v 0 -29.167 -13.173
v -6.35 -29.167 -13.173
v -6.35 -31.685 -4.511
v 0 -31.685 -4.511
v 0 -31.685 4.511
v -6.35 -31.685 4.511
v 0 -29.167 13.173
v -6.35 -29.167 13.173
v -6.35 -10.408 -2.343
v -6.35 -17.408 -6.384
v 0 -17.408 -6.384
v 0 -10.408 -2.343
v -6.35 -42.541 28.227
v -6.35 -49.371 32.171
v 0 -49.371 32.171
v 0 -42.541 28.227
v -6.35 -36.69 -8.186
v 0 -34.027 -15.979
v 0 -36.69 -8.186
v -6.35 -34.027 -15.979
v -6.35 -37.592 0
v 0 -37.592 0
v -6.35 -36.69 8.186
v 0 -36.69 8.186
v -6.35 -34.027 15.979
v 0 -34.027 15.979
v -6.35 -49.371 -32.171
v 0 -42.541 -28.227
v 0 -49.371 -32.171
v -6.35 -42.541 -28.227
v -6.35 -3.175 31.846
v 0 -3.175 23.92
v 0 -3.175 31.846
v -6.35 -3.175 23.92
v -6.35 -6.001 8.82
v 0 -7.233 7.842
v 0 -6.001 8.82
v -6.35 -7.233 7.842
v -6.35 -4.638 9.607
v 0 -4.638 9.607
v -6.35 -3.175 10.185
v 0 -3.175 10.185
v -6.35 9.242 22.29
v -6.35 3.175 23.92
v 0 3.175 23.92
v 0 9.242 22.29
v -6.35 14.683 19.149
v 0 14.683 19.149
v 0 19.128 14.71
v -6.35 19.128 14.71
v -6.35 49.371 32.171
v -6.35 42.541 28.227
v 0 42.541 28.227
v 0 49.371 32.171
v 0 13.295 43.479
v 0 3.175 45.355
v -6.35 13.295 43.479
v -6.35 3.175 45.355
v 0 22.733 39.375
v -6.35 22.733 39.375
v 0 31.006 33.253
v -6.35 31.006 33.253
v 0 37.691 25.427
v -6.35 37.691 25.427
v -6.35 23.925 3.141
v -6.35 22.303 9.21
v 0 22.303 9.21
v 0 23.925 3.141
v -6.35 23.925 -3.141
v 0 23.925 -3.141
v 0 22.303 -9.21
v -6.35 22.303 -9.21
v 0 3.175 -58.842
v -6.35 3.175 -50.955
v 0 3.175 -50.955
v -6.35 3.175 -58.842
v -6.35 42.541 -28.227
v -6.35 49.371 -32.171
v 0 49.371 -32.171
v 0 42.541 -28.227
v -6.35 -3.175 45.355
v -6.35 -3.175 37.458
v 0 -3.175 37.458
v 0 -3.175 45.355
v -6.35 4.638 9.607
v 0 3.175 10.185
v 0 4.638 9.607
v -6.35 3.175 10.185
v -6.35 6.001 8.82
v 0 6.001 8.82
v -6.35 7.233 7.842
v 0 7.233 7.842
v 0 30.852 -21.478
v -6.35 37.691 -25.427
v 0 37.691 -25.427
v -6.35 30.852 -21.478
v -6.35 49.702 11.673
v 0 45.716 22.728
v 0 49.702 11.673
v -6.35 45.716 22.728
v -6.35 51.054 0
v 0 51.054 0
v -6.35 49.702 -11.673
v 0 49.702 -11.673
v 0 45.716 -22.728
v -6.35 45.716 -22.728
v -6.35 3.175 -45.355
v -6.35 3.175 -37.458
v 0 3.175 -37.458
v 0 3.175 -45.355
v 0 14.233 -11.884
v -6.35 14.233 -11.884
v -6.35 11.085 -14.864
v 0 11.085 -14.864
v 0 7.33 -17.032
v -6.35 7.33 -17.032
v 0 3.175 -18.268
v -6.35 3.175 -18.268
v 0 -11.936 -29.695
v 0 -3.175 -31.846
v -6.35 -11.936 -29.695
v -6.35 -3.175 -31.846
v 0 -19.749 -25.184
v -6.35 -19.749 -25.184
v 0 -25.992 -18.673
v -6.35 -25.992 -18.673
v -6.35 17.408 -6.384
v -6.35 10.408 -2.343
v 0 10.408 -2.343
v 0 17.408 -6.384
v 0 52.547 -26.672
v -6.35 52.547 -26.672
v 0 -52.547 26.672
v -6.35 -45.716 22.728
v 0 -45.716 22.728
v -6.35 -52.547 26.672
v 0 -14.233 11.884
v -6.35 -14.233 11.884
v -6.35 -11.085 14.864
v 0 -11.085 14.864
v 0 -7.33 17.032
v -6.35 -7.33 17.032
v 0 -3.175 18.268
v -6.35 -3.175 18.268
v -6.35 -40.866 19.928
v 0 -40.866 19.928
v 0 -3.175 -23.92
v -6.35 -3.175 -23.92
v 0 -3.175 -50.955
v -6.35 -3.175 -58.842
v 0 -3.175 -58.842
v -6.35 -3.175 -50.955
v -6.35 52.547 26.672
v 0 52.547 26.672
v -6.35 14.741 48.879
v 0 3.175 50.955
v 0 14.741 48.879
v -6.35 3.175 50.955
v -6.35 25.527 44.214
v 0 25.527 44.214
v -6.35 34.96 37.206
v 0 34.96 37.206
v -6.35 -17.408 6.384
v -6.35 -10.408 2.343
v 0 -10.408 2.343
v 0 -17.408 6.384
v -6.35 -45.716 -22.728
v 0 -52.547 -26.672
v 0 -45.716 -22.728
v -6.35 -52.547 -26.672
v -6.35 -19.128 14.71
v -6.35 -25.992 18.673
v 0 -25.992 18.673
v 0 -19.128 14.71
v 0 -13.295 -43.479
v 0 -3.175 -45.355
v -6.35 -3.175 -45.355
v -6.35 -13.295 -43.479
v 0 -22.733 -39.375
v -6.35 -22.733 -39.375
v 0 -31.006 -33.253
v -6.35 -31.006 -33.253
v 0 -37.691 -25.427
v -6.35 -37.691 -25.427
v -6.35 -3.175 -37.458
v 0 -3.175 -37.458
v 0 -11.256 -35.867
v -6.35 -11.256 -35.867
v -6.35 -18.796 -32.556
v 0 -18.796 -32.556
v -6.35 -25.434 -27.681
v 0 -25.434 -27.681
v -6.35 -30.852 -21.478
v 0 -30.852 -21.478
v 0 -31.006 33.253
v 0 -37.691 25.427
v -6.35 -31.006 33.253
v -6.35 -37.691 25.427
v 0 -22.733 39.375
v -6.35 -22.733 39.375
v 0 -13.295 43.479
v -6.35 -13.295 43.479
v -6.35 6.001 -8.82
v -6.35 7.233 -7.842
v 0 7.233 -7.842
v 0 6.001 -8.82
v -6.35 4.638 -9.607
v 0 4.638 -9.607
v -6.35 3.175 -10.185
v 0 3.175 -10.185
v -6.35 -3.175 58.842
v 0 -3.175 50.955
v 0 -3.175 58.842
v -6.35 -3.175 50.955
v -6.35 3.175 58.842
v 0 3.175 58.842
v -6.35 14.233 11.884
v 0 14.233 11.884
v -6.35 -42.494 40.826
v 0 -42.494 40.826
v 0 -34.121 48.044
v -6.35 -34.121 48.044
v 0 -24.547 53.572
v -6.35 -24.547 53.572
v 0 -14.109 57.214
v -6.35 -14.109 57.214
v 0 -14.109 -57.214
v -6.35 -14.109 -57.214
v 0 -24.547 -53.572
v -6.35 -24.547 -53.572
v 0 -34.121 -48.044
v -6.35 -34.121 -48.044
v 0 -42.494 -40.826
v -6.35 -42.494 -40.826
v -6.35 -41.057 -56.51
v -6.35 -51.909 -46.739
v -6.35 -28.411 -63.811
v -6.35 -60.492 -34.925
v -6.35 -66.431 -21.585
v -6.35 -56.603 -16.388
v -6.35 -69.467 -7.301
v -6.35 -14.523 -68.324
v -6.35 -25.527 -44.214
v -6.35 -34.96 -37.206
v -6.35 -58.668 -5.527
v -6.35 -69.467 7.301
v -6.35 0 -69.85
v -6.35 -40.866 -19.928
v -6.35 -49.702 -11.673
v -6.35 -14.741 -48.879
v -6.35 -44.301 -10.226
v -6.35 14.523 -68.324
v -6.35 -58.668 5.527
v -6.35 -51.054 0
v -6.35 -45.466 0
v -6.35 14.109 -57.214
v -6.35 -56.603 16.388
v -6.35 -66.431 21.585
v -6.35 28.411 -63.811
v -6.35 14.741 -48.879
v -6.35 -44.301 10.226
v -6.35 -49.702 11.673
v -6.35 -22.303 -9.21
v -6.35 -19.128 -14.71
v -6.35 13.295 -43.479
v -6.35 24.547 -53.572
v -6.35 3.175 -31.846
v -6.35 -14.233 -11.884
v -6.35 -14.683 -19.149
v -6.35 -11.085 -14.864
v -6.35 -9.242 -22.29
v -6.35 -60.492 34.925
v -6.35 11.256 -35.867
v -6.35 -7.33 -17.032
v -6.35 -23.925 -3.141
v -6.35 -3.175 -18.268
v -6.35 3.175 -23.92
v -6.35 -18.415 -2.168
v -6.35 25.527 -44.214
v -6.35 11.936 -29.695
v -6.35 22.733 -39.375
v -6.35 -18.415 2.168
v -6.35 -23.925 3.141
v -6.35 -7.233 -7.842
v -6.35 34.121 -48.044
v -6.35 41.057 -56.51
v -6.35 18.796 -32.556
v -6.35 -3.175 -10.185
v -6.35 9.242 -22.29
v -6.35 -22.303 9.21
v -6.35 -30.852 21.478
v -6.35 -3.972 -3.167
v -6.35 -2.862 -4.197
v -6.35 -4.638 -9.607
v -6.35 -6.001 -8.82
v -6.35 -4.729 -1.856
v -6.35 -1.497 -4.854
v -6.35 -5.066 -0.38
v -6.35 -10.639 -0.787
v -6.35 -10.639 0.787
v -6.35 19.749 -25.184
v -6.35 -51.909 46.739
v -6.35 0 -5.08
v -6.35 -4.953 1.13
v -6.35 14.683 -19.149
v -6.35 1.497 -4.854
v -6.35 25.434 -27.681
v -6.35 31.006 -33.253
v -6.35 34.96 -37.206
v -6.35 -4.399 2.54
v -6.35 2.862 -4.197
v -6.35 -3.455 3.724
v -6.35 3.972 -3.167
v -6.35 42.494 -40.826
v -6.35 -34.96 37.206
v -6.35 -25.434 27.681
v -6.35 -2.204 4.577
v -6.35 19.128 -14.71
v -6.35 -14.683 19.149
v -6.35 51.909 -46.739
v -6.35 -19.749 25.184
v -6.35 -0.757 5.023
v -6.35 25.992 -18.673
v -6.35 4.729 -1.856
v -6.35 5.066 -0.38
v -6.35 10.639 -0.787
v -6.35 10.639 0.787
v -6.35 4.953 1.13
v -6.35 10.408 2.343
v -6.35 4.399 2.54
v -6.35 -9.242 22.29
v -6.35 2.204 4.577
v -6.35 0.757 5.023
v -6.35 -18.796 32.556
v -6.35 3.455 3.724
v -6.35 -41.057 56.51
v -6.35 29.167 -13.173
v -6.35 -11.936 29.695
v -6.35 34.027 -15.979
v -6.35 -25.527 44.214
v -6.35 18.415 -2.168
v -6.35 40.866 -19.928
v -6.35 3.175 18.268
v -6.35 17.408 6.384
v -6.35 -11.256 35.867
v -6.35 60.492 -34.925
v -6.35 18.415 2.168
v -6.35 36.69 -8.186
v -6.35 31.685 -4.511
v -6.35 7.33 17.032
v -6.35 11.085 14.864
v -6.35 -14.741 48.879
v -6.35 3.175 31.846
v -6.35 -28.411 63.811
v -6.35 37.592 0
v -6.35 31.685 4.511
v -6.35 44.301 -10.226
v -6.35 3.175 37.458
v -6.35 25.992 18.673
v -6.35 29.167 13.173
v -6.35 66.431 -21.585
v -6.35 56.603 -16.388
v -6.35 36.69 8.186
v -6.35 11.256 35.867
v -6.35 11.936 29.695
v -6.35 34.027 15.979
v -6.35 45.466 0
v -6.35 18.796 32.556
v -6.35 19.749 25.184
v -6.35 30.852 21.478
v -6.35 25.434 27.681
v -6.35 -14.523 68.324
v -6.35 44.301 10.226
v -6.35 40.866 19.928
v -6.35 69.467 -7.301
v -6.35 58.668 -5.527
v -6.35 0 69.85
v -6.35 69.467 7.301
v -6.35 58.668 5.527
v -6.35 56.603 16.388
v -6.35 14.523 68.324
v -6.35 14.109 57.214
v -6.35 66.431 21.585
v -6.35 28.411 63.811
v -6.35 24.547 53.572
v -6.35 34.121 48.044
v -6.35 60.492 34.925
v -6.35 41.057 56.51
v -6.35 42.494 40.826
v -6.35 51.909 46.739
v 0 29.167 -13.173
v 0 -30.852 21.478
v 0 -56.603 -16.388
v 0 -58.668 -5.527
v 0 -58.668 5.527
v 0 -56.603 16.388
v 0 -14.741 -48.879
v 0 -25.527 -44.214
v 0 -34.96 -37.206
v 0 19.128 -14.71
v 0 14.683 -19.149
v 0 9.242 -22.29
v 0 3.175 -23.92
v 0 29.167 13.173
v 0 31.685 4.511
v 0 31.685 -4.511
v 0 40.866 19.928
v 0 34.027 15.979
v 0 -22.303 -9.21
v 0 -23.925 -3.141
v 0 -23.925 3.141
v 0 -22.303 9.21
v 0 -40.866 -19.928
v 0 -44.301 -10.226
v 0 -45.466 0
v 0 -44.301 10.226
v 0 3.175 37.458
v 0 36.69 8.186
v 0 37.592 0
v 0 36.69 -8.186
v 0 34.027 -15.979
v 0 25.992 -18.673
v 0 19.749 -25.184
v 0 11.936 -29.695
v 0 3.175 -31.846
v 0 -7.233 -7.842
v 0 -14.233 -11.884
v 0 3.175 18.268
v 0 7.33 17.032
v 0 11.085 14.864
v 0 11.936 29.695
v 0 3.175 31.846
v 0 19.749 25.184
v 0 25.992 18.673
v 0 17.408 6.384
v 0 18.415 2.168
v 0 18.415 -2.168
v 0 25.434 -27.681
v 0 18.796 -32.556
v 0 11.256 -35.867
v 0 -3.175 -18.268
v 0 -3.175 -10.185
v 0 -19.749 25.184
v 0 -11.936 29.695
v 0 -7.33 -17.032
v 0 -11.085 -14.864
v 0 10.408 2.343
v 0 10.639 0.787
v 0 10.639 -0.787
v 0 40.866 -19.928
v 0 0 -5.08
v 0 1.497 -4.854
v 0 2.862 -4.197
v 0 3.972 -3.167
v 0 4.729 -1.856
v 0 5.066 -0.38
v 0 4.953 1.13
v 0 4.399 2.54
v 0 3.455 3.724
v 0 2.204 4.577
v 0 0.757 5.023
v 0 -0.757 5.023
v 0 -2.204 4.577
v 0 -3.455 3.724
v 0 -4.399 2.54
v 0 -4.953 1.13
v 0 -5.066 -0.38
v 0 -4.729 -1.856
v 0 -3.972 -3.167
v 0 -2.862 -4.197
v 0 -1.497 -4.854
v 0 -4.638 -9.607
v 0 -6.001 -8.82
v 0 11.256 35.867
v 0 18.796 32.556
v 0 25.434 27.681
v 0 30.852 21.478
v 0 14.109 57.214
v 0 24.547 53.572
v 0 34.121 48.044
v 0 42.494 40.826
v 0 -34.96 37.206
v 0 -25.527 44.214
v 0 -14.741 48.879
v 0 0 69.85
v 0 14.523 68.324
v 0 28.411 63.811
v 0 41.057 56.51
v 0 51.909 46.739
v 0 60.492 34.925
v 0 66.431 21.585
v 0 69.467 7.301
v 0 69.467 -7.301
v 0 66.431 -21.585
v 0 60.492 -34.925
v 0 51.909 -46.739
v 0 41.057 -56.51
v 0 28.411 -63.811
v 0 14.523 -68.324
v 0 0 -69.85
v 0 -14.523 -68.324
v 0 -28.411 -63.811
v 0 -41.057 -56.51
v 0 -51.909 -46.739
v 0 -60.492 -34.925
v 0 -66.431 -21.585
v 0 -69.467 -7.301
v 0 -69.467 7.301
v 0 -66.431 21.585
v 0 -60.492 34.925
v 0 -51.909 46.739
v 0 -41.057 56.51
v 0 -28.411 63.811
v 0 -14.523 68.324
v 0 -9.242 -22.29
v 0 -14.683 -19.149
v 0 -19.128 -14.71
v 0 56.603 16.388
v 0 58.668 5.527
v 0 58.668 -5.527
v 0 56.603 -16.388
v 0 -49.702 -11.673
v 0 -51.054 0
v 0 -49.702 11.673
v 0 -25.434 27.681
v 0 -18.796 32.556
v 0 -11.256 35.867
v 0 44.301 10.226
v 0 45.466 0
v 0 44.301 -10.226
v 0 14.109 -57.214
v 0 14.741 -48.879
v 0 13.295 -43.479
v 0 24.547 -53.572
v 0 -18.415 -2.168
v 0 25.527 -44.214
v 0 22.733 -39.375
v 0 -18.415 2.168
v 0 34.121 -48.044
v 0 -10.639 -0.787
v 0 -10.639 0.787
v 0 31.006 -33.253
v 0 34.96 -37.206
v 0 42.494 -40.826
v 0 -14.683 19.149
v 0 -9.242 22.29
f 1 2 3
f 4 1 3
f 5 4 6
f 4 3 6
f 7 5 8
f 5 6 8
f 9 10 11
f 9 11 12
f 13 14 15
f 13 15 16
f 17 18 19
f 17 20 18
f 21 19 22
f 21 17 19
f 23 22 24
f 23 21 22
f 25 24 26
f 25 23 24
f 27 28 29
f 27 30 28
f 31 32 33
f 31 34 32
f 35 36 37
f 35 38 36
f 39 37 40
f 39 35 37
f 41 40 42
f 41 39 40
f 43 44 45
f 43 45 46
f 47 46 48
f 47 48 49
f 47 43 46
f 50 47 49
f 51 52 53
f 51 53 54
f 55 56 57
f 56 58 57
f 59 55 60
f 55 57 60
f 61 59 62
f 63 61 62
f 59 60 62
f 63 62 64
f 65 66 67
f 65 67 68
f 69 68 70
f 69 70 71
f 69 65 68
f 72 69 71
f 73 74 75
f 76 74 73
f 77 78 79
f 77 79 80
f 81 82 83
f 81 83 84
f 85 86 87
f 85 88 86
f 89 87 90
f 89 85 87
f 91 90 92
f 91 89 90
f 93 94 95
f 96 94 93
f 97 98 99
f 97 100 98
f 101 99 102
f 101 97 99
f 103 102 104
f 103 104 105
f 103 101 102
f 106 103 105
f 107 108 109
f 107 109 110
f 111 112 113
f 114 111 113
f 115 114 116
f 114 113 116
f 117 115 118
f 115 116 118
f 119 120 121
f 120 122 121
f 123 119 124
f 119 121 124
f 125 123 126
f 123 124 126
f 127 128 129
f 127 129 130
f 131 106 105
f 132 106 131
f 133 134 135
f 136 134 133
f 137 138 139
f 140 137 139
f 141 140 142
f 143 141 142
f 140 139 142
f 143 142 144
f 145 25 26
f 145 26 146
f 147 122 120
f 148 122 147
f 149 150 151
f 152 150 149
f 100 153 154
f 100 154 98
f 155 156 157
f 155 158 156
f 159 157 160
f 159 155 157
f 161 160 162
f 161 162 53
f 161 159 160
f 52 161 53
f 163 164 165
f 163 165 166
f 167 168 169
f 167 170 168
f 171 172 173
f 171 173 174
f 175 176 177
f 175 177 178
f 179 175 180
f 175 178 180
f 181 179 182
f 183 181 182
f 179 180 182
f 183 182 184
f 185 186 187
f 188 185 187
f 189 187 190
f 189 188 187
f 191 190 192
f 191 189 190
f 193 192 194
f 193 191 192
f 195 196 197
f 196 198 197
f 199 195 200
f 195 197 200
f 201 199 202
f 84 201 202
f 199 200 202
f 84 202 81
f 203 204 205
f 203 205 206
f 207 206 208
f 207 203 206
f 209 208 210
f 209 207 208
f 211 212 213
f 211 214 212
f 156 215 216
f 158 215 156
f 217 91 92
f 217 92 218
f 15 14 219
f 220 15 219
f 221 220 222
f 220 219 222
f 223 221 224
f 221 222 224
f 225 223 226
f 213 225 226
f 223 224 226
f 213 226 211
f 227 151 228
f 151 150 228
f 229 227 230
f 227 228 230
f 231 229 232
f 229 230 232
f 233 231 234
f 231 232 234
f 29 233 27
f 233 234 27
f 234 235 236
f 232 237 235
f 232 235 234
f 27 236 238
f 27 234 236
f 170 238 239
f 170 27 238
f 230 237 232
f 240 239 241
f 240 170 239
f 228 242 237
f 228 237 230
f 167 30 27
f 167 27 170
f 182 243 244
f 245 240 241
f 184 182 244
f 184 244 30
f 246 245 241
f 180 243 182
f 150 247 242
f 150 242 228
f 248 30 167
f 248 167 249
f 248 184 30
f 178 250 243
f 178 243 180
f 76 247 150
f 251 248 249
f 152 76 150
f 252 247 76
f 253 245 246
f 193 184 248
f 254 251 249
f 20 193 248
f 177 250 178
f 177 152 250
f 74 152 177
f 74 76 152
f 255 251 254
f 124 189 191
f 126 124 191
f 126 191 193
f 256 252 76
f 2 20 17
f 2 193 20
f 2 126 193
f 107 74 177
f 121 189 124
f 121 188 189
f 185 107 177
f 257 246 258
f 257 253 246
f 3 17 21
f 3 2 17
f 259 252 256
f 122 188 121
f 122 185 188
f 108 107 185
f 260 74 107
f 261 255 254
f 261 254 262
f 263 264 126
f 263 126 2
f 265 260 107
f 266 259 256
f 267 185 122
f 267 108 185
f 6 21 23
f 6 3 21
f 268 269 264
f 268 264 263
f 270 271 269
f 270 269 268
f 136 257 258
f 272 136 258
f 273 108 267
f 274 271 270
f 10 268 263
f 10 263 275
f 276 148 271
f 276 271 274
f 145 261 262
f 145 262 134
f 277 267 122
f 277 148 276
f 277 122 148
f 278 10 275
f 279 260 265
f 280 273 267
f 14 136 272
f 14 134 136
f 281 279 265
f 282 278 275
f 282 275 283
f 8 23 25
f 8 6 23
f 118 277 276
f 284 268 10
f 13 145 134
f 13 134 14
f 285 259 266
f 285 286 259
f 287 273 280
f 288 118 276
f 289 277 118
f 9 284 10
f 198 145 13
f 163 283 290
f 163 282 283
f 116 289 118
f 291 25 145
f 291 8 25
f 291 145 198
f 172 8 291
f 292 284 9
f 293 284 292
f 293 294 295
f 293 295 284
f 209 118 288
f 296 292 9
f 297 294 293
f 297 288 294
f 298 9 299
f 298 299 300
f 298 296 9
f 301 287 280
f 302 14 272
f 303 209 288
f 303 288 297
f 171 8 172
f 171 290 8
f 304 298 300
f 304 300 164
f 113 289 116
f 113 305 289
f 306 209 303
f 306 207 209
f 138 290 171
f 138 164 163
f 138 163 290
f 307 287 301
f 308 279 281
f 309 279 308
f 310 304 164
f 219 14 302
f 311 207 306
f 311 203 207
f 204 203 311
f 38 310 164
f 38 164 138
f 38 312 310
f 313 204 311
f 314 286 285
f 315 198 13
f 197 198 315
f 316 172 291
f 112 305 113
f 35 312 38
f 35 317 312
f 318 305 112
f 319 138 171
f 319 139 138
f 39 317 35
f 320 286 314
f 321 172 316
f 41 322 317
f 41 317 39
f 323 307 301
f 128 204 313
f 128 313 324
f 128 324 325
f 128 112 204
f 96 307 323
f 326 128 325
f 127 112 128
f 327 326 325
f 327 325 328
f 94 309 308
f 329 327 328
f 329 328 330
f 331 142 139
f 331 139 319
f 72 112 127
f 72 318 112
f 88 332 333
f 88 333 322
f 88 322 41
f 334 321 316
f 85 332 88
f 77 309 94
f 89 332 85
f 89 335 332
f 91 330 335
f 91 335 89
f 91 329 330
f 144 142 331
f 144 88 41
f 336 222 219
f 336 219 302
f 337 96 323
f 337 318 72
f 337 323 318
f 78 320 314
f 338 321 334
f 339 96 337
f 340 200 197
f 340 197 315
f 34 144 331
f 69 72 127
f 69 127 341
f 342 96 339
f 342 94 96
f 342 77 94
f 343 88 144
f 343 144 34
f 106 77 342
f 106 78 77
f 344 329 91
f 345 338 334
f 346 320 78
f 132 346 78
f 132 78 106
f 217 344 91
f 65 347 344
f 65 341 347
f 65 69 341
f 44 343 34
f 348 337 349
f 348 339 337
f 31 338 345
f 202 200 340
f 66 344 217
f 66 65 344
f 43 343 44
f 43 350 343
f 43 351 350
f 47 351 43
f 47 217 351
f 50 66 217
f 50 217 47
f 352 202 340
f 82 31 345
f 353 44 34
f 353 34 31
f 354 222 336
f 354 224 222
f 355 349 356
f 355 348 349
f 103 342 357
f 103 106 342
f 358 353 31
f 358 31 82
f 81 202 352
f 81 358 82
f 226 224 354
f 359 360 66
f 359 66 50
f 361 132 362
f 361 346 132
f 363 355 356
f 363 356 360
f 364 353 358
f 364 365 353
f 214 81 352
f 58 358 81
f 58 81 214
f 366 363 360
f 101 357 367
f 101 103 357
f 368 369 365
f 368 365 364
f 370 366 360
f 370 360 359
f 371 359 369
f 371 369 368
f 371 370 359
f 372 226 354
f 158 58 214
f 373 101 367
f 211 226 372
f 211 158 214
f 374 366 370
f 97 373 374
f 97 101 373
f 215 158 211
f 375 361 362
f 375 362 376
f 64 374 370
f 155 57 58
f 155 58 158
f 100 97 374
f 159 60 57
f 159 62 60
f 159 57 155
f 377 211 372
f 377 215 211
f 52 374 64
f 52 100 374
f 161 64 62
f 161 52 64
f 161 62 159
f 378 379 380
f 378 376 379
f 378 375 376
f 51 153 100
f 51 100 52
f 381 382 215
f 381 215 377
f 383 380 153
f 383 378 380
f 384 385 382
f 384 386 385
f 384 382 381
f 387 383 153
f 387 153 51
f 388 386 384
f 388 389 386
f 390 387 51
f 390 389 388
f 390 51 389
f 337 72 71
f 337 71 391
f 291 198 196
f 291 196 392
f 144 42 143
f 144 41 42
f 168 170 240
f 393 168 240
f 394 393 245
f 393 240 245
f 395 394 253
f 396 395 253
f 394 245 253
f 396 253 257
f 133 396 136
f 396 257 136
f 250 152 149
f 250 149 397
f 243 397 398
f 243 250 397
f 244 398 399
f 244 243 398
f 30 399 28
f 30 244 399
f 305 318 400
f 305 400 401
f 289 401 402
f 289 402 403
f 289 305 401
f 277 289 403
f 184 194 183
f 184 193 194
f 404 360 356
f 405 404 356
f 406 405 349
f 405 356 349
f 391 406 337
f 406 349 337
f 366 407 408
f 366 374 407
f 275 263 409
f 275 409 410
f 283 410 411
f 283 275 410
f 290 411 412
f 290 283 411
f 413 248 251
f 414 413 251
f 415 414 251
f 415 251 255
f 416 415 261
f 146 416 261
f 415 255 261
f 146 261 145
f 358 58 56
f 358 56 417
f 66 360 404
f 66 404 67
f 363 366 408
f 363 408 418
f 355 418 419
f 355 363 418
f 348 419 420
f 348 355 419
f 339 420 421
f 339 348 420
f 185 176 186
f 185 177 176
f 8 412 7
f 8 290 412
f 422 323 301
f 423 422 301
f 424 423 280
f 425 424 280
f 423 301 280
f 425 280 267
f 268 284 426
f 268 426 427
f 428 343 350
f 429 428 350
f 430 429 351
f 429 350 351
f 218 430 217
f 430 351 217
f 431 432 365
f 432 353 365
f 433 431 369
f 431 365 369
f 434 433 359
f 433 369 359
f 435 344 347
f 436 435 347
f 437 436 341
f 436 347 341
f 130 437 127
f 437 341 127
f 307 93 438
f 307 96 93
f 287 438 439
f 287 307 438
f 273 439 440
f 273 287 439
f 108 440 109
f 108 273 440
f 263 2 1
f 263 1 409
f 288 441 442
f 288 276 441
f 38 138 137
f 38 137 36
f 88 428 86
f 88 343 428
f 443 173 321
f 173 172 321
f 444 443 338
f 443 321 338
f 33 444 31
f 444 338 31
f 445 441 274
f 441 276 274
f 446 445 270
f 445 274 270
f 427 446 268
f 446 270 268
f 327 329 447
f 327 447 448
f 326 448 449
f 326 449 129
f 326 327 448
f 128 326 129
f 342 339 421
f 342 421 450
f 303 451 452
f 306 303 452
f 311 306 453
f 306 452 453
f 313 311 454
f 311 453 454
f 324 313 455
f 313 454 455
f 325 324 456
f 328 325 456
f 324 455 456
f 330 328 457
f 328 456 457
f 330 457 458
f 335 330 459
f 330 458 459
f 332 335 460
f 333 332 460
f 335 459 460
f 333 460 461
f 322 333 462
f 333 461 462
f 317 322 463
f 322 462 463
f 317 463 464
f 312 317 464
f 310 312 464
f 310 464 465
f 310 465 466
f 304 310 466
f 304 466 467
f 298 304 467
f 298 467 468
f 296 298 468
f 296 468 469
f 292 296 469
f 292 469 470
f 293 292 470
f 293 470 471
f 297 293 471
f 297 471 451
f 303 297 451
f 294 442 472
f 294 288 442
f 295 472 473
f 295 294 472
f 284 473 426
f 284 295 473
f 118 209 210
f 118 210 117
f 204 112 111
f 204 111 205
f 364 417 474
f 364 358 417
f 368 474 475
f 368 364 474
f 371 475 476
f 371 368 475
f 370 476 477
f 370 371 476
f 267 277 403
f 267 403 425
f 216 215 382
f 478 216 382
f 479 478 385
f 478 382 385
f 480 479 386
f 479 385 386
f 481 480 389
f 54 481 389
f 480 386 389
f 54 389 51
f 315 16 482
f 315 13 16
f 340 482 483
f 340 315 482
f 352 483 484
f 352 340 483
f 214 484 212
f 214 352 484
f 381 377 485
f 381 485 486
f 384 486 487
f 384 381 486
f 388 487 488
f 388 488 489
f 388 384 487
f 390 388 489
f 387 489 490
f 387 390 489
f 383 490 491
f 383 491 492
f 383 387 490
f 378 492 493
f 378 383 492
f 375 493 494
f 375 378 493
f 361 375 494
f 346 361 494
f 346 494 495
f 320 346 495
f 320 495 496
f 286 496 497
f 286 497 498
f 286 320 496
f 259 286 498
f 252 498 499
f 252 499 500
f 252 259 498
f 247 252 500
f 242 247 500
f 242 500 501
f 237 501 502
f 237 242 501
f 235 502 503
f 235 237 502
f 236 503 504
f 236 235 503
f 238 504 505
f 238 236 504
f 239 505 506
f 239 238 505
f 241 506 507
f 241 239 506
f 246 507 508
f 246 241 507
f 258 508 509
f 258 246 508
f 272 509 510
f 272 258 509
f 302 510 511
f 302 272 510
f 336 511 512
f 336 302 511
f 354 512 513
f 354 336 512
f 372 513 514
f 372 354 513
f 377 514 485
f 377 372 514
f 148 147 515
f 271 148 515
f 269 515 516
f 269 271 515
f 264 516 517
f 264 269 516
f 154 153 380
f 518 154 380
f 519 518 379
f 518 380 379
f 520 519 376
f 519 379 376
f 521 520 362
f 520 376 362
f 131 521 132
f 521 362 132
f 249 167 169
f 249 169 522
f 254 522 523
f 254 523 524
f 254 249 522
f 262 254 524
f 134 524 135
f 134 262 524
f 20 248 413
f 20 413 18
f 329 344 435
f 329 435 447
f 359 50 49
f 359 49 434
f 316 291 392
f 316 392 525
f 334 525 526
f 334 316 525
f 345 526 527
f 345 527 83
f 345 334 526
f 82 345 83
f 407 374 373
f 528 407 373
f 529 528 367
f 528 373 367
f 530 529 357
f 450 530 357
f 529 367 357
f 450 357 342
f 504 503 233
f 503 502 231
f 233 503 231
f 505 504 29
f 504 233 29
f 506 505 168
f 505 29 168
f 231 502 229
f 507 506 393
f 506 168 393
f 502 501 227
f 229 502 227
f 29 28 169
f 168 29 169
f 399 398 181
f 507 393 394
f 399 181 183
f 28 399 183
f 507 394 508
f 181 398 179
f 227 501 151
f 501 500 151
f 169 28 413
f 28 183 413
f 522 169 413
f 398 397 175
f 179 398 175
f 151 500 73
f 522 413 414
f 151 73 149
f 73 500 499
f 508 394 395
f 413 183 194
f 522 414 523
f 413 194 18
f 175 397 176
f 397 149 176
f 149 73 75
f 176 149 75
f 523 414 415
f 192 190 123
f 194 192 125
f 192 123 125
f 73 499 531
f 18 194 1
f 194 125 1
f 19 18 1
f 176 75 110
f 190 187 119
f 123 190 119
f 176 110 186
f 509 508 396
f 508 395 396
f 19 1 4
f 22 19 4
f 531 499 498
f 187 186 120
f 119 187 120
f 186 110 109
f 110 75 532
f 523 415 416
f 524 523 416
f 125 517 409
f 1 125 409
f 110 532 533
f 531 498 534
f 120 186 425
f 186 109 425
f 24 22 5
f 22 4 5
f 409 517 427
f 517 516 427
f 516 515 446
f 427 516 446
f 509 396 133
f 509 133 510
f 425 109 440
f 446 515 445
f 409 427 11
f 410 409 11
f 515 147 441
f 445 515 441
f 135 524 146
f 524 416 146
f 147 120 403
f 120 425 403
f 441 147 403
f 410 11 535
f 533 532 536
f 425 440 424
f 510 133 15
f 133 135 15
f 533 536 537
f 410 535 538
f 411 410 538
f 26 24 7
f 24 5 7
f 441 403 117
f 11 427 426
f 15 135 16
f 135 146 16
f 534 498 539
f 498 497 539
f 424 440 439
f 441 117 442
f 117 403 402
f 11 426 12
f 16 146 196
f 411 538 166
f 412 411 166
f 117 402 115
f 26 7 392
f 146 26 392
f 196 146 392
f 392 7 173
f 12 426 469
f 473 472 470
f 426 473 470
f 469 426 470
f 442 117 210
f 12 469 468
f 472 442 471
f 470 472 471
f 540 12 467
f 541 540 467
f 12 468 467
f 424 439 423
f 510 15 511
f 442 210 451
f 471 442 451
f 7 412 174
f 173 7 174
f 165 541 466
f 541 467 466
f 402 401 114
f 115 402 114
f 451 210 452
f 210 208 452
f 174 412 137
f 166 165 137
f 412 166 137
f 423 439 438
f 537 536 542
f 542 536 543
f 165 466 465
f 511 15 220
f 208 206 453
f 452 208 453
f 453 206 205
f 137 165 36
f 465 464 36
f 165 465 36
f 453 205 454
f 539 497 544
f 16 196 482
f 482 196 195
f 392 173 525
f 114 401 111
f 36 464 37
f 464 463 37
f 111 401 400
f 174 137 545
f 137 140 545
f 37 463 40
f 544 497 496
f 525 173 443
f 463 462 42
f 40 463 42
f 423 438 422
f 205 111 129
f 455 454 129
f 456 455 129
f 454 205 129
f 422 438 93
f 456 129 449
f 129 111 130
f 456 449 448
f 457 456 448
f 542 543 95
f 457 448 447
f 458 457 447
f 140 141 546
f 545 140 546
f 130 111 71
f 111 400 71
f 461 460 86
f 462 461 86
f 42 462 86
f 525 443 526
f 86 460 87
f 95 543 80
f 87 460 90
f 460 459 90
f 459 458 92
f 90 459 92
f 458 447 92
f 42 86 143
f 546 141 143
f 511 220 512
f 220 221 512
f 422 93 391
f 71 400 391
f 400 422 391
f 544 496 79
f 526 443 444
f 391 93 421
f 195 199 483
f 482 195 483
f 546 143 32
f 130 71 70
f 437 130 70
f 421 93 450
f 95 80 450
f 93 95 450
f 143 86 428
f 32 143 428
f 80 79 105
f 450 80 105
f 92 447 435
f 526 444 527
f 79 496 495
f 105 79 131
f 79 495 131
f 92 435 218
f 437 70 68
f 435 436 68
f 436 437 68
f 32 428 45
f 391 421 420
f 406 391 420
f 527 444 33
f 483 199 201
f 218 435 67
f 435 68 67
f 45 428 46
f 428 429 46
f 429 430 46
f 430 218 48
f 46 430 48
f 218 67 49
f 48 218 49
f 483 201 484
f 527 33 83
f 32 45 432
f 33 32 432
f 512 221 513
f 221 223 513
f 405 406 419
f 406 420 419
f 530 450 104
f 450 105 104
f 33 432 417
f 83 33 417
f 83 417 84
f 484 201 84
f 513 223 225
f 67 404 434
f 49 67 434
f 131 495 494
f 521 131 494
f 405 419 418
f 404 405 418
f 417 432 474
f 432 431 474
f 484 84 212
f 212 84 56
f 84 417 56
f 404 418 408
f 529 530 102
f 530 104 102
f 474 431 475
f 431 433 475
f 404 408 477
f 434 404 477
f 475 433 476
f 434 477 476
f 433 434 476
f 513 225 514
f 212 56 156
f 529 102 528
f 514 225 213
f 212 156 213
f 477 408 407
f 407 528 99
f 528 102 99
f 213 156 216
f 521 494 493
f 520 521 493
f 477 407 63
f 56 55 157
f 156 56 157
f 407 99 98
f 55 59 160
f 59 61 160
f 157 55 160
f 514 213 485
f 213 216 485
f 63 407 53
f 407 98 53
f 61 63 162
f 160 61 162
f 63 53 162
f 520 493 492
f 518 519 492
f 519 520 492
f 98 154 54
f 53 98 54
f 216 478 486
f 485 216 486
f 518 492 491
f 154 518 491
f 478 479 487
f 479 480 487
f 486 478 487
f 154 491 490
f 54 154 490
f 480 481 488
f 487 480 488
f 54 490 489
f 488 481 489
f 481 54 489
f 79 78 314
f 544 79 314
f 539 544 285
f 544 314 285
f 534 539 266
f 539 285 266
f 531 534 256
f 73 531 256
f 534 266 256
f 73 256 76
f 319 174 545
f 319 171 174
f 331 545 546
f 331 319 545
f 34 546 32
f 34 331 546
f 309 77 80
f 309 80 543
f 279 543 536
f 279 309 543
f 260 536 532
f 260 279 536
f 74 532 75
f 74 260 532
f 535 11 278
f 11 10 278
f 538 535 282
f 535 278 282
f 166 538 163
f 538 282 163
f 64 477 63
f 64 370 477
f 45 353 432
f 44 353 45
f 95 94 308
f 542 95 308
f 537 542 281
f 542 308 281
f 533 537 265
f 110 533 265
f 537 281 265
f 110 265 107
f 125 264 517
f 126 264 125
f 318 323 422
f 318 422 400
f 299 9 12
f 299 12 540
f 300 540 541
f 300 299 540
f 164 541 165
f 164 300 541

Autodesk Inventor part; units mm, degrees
ref_plane "YZ Plane" through (0, 0, 0) normal (1, 0, 0) x (0, 1, 0)
ref_plane "XZ Plane" through (0, 0, 0) normal (0, 1, 0) x (-1, 0, 0)
ref_plane "XY Plane" through (0, 0, 0) normal (0, 0, 1) x (1, 0, 0)
sketch "Sketch1" plane through (0, 0, 0) normal (0, 1, 0) x (-1, 0, 0)
  line L0 (0, 5.08) -> (0, 10.668)
  line L1 (0, 0) -> (0, 10.668) construction
  line L2 (0, 10.668) -> (0, 18.542)
  line L3 (0, 18.542) -> (0, 24.13)
  line L4 (0, 24.13) -> (0, 32.004)
  line L5 (0, 32.004) -> (0, 37.592)
  line L6 (0, 37.592) -> (0, 45.466)
  line L7 (0, 45.466) -> (0, 51.054)
  line L8 (0, 51.054) -> (0, 58.928)
  line L9 (0, 58.928) -> (0, 66.802)
  line L10 (0, 0) -> (8.7387, 6.1189) construction
  line L11 (0, 0) -> (0, 18.542) construction
  line L12 (0, 0) -> (0, 24.13) construction
  line L13 (0, 0) -> (0, 32.004) construction
  line L14 (0, 0) -> (0, 37.592) construction
  line L15 (0, 0) -> (0, 45.466) construction
  line L16 (0, 0) -> (0, 51.054) construction
  line L17 (0, 0) -> (0, 58.928) construction
  line L18 (0, 0) -> (0, 66.802) construction
  line L19 (0, 0) -> (69.85, 0) construction
  line L20 (0, 0) -> (69.85, 0) construction
  line L21 (0, 66.802) -> (0, 69.85)
  line L22 (0, 0) -> (0, 5.08)
  line L23 (0, 69.85) -> (6.35, 69.85)
  line L24 (6.35, 69.85) -> (6.35, 0)
  line L25 (0, 5.08) -> (6.35, 5.08)
  line L26 (0, 10.668) -> (6.35, 10.668)
  line L27 (0, 18.542) -> (6.35, 18.542)
  line L28 (0, 24.13) -> (6.35, 24.13)
  line L29 (0, 32.004) -> (6.35, 32.004)
  line L30 (0, 37.592) -> (6.35, 37.592)
  line L31 (0, 45.466) -> (6.35, 45.466)
  line L32 (0, 51.054) -> (6.35, 51.054)
  line L33 (0, 58.928) -> (6.35, 58.928)
  dimension "d2" = 5.588
  dimension "d4" = 7.874
  dimension "d5" = 5.588
  dimension "d6" = 7.874
  dimension "d7" = 5.588
  dimension "d8" = 7.874
  dimension "d9" = 5.588
  dimension "d10" = 7.874
  dimension "d11" = 7.874
  dimension "d24" = 5.08
  dimension "d25" = 6.35
  dimension "d26" = 3.048
revolve "Revolution1" add sketch "Sketch1" angle 360 about axis through (0, 0, 0) along (-1, 0, 0) contours L0 L26 L24 L25 | L3 L28 L24 L27 | L5 L30 L24 L29 | L7 L32 L24 L31 | L9 L21 L23 L24 L33
sketch "Sketch2" plane through (-6.35, 0, 0) normal (-1, 0, 0) x (0, 0, 1)
  line L0 (69.6277, 3.175) -> (-69.6277, 3.175)
  line L1 (-69.6277, 3.175) -> (-69.6277, -3.175)
  line L2 (-69.6277, -3.175) -> (69.6277, -3.175)
  line L3 (69.6277, -3.175) -> (69.6277, 3.175)
  circle A0 centre (0, 0) radius 5.08 projected
  line L4 (69.6277, 3.175) -> (-69.6277, -3.175) construction
  line L5 (-69.6277, 3.175) -> (69.6277, -3.175) construction
  line L6 (32.0642, 61.8868) -> (-37.5635, -58.7118)
  line L7 (-32.0642, -61.8868) -> (37.5635, 58.7118)
  line L8 (-37.5635, -58.7118) -> (-32.0642, -61.8868)
  line L9 (37.5635, 58.7118) -> (32.0642, 61.8868)
  line L10 (37.5635, -58.7118) -> (-32.0642, 61.8868)
  line L11 (-37.5635, 58.7118) -> (32.0642, -61.8868)
  line L12 (-32.0642, 61.8868) -> (-37.5635, 58.7118)
  line L13 (32.0642, -61.8868) -> (37.5635, -58.7118)
  point P0 (-5.4993, 3.175)
  point P1 (-5.4993, -3.175)
  point P2 (0, -6.35)
  point P3 (5.4993, -3.175)
  point P4 (5.4993, 3.175)
  point P5 (0, 6.35)
  dimension "d28" = 6.35
  dimension "d31" = 360
extrude "Extrusion1" add sketch "Sketch2" against normal blind 6.35
sketch "Sketch3" plane through (0, 0, 0) normal (1, 0, 0) x (0, 0, -1)
  circle A0 centre (0, 0) radius 5.08
  dimension "d35" = 10.16
extrude "Extrusion2" cut sketch "Sketch3" against normal blind 25.4
equation "\"d2\" = PR"
equation "\"d4\" = HR"
equation "\"d5\" = PR"
equation "\"d6\" = HR"
equation "\"d7\" = PR"
equation "\"d8\" = HR"
equation "\"d9\" = PR"
equation "\"d10\" = HR"
equation "\"d11\" = HR"
equation "\"HR\" = 7.874"
equation "\"PR\" = 5.588"
equation "\"HA\" = 55deg"
properties part number "flat drain cover"
